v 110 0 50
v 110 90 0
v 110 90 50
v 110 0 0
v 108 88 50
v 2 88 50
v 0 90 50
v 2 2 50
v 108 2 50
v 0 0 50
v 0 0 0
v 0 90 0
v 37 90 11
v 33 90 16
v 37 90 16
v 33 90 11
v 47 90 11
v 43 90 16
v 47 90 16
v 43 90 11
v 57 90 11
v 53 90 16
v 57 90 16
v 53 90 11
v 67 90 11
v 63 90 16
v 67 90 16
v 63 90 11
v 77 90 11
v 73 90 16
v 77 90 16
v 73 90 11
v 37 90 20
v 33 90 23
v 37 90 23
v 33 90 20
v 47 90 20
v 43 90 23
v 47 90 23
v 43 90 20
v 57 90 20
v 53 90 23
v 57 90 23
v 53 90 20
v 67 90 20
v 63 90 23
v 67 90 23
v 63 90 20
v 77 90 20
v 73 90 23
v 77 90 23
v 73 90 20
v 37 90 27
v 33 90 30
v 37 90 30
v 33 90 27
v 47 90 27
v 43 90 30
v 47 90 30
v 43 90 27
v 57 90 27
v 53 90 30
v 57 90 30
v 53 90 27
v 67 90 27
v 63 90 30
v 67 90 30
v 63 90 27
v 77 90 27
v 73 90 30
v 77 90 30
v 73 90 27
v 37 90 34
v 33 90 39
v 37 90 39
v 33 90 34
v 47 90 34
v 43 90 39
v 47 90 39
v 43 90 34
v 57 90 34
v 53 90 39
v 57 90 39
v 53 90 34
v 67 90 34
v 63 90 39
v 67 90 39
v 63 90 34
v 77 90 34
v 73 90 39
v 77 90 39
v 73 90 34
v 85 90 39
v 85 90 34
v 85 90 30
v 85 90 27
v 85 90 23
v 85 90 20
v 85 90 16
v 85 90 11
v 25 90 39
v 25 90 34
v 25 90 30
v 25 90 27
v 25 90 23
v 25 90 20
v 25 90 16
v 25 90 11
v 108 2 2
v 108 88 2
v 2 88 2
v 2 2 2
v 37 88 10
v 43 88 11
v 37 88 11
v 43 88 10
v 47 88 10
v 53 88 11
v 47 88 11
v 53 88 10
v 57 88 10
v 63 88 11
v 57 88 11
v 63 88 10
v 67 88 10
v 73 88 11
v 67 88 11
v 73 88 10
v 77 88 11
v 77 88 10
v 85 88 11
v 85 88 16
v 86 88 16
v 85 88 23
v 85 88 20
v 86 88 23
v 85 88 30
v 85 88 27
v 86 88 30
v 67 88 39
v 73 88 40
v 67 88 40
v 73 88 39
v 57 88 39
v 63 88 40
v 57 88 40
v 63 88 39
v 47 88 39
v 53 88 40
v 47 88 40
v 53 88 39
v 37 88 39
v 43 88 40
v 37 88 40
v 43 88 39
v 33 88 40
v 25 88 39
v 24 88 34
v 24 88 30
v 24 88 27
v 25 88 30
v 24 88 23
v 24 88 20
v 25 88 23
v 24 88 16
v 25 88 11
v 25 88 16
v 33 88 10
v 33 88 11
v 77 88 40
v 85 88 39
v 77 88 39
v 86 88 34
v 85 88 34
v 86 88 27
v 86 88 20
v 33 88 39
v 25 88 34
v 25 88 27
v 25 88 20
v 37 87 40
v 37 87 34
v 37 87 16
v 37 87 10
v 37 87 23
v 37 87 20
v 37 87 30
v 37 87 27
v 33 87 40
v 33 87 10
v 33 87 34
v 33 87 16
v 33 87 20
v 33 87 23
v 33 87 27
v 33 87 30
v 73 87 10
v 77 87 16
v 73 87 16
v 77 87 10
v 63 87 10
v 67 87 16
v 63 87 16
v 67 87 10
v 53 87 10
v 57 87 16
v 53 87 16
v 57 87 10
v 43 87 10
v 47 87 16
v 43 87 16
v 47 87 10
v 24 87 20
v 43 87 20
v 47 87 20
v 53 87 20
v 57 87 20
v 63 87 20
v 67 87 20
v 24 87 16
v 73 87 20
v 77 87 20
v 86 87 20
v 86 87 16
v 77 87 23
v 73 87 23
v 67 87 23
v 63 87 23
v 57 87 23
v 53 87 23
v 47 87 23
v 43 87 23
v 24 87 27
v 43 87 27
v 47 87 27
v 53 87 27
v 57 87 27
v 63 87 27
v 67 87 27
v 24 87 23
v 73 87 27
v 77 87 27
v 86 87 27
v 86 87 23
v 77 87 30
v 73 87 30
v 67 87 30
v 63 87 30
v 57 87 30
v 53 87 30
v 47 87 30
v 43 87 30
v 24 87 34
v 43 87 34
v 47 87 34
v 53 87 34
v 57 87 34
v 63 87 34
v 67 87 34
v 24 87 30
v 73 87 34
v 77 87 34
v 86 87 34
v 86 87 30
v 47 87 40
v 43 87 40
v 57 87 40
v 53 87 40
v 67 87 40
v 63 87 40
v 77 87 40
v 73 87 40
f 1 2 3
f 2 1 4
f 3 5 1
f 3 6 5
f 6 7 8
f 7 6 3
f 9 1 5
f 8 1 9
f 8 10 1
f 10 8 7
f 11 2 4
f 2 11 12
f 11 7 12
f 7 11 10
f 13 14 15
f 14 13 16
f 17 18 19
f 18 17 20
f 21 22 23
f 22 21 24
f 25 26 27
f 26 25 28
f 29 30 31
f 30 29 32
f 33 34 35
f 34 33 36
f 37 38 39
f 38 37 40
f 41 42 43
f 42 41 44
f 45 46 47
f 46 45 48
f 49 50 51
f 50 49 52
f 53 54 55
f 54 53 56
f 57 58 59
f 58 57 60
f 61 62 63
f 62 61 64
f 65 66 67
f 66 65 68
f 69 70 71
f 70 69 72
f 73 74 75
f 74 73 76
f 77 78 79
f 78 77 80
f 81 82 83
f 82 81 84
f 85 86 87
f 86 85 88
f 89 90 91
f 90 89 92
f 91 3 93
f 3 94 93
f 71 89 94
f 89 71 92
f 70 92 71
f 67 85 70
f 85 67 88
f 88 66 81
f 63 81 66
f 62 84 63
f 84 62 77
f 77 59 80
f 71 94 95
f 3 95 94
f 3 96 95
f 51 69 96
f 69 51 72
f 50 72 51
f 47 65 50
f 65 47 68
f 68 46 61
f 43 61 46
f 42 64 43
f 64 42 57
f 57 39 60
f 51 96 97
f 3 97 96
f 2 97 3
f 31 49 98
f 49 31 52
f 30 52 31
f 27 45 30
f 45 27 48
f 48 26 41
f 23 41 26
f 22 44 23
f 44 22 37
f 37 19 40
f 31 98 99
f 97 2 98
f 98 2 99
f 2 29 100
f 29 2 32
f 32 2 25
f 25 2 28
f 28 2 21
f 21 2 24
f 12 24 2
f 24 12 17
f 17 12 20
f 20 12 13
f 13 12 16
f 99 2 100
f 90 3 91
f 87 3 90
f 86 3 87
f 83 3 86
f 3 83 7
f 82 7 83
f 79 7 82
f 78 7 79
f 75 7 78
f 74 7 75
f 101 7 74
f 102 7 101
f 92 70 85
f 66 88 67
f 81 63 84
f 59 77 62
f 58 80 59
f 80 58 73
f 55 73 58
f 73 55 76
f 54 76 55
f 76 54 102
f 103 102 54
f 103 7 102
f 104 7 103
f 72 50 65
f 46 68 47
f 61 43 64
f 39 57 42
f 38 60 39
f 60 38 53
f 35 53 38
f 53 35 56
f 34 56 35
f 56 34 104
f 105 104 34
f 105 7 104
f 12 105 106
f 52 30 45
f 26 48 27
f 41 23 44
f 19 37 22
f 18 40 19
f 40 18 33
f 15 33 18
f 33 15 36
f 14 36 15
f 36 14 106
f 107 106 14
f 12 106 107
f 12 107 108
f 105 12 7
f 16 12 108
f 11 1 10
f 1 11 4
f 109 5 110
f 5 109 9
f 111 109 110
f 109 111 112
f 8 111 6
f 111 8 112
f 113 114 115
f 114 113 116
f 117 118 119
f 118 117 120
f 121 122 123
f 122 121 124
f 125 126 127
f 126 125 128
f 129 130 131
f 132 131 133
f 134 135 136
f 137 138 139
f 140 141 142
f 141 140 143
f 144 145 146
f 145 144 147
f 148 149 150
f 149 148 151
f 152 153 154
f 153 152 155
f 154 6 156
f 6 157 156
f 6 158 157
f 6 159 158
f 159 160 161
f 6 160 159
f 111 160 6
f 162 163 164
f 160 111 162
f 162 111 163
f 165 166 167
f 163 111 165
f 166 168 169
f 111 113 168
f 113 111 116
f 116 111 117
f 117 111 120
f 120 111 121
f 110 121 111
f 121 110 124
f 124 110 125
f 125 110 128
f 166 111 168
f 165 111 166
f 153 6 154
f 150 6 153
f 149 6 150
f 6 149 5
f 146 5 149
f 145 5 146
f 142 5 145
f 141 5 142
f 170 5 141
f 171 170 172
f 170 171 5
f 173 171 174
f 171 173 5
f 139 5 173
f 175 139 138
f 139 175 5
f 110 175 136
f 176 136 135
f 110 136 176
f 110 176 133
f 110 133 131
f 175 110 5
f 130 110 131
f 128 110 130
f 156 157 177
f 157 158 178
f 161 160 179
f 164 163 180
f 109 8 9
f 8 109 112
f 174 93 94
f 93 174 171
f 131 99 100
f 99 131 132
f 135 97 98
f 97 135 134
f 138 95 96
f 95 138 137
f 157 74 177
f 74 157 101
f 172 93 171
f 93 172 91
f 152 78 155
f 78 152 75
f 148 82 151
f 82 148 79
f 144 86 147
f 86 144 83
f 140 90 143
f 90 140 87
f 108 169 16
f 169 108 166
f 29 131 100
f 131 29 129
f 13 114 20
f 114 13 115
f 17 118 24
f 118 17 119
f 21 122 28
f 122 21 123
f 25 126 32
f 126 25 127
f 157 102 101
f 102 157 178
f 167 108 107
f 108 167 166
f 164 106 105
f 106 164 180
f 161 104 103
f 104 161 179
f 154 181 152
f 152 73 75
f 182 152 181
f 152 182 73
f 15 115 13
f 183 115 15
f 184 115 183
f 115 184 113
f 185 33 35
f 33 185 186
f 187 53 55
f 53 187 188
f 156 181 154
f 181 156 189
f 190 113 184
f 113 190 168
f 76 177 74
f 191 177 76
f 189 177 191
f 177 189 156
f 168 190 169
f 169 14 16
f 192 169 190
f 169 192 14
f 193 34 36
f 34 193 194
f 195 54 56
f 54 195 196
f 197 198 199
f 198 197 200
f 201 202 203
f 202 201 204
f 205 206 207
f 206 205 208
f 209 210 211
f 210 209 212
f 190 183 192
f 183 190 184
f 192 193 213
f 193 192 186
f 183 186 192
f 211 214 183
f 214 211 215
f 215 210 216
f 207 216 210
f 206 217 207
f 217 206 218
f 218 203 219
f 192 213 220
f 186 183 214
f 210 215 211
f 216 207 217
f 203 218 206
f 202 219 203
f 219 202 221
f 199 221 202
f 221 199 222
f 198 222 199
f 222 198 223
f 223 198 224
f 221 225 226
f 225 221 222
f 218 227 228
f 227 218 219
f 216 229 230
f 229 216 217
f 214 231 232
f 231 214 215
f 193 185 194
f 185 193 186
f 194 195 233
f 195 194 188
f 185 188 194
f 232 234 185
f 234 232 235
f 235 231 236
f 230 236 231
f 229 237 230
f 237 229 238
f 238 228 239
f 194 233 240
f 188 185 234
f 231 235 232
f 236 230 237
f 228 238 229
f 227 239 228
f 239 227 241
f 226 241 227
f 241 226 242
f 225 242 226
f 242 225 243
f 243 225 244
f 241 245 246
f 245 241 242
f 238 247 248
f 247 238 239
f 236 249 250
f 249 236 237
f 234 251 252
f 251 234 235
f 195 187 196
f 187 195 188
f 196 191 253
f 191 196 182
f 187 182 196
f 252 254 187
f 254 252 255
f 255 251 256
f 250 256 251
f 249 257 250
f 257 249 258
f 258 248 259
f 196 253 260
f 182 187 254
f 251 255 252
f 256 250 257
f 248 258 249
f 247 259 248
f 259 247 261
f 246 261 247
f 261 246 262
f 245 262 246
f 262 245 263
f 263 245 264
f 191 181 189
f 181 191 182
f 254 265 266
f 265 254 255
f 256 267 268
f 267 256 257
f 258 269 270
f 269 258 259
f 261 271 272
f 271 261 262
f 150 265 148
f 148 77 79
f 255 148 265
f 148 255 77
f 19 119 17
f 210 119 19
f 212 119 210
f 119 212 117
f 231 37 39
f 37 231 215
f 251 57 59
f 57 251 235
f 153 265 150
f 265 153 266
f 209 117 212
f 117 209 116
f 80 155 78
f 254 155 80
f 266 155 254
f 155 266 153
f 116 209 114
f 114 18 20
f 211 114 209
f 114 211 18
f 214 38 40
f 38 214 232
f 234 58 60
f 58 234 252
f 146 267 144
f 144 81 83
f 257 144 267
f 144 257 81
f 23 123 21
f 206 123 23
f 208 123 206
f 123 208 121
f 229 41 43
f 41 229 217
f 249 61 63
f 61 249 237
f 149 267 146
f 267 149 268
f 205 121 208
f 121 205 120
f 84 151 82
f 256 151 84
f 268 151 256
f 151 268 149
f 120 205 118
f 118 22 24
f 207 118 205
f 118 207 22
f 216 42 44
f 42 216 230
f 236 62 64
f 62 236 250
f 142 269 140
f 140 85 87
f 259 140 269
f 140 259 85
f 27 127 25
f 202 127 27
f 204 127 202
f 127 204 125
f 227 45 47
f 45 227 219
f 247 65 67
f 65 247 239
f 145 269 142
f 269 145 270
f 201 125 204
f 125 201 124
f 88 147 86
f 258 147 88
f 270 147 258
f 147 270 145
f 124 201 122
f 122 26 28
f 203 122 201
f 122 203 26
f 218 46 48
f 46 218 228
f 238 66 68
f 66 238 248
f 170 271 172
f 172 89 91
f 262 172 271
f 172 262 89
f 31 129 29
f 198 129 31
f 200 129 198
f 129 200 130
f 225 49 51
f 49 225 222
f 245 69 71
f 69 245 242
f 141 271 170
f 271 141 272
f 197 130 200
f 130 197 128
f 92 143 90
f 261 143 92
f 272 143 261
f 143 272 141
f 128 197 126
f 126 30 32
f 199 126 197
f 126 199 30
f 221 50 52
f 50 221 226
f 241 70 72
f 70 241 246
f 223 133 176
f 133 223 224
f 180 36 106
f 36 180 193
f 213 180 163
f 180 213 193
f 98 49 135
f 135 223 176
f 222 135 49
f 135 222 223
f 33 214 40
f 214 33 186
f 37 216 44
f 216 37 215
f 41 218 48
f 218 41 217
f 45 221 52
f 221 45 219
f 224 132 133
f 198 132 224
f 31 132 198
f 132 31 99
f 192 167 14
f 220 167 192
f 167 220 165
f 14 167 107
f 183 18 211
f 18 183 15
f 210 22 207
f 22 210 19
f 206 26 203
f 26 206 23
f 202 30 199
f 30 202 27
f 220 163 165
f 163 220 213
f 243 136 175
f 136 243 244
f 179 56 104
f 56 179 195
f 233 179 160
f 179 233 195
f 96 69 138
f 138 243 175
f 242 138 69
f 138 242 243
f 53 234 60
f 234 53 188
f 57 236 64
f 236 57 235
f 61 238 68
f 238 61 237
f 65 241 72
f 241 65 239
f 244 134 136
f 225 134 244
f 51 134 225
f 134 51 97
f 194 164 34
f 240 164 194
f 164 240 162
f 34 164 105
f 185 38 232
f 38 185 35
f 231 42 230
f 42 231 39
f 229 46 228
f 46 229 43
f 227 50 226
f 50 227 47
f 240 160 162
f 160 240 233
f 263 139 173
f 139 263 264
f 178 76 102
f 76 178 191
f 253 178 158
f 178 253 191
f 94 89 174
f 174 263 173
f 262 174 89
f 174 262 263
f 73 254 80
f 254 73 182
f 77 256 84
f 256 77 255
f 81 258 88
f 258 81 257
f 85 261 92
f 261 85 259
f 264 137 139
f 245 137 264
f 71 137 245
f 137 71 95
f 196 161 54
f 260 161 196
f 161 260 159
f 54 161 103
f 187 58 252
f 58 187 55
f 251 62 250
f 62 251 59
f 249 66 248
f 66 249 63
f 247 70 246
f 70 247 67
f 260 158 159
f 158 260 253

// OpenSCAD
$fn = 32;

// ----------------------------------------------------------------------
// Vent box: crossgrid enclosure
// ----------------------------------------------------------------------

// --- parameters (mm) ---
box_l = 110;              // box length, X
box_w = 90;               // box width, Y
box_h = 50;               // box height, Z
wall_t = 2;               // shell wall thickness
win_l = 60;               // vent window width, X
win_h = 28;               // vent window height, Z
bar_w = 4;                // grid bar width
n_v = 5;                  // vertical bar count
n_h = 3;                  // horizontal bar count

win_z0 = (box_h - win_h) / 2;  // window lower edge Z
v_step = win_l / (n_v + 1);  // vertical bar step
h_step = win_h / (n_h + 1);  // horizontal bar step

difference() {
  union() {
    difference() {
      cube([box_l, box_w, box_h]);
  translate([wall_t, wall_t, wall_t])
    cube([box_l - 2 * wall_t, box_w - 2 * wall_t, box_h]);
  translate([(box_l - win_l) / 2, box_w - wall_t - 1, win_z0])
    cube([win_l, wall_t + 2, win_h]);
    }
    for (i = [1 : n_v])
      translate([(box_l - win_l) / 2 + i * v_step - bar_w / 2,
                 box_w - wall_t - 1, win_z0 - 1])
        cube([bar_w, wall_t + 1, win_h + 2]);
    for (i = [1 : n_h])
      translate([(box_l - win_l) / 2 - 1, box_w - wall_t - 1,
                 win_z0 + i * h_step - bar_w / 2])
        cube([win_l + 2, wall_t + 1, bar_w]);
  }
}
